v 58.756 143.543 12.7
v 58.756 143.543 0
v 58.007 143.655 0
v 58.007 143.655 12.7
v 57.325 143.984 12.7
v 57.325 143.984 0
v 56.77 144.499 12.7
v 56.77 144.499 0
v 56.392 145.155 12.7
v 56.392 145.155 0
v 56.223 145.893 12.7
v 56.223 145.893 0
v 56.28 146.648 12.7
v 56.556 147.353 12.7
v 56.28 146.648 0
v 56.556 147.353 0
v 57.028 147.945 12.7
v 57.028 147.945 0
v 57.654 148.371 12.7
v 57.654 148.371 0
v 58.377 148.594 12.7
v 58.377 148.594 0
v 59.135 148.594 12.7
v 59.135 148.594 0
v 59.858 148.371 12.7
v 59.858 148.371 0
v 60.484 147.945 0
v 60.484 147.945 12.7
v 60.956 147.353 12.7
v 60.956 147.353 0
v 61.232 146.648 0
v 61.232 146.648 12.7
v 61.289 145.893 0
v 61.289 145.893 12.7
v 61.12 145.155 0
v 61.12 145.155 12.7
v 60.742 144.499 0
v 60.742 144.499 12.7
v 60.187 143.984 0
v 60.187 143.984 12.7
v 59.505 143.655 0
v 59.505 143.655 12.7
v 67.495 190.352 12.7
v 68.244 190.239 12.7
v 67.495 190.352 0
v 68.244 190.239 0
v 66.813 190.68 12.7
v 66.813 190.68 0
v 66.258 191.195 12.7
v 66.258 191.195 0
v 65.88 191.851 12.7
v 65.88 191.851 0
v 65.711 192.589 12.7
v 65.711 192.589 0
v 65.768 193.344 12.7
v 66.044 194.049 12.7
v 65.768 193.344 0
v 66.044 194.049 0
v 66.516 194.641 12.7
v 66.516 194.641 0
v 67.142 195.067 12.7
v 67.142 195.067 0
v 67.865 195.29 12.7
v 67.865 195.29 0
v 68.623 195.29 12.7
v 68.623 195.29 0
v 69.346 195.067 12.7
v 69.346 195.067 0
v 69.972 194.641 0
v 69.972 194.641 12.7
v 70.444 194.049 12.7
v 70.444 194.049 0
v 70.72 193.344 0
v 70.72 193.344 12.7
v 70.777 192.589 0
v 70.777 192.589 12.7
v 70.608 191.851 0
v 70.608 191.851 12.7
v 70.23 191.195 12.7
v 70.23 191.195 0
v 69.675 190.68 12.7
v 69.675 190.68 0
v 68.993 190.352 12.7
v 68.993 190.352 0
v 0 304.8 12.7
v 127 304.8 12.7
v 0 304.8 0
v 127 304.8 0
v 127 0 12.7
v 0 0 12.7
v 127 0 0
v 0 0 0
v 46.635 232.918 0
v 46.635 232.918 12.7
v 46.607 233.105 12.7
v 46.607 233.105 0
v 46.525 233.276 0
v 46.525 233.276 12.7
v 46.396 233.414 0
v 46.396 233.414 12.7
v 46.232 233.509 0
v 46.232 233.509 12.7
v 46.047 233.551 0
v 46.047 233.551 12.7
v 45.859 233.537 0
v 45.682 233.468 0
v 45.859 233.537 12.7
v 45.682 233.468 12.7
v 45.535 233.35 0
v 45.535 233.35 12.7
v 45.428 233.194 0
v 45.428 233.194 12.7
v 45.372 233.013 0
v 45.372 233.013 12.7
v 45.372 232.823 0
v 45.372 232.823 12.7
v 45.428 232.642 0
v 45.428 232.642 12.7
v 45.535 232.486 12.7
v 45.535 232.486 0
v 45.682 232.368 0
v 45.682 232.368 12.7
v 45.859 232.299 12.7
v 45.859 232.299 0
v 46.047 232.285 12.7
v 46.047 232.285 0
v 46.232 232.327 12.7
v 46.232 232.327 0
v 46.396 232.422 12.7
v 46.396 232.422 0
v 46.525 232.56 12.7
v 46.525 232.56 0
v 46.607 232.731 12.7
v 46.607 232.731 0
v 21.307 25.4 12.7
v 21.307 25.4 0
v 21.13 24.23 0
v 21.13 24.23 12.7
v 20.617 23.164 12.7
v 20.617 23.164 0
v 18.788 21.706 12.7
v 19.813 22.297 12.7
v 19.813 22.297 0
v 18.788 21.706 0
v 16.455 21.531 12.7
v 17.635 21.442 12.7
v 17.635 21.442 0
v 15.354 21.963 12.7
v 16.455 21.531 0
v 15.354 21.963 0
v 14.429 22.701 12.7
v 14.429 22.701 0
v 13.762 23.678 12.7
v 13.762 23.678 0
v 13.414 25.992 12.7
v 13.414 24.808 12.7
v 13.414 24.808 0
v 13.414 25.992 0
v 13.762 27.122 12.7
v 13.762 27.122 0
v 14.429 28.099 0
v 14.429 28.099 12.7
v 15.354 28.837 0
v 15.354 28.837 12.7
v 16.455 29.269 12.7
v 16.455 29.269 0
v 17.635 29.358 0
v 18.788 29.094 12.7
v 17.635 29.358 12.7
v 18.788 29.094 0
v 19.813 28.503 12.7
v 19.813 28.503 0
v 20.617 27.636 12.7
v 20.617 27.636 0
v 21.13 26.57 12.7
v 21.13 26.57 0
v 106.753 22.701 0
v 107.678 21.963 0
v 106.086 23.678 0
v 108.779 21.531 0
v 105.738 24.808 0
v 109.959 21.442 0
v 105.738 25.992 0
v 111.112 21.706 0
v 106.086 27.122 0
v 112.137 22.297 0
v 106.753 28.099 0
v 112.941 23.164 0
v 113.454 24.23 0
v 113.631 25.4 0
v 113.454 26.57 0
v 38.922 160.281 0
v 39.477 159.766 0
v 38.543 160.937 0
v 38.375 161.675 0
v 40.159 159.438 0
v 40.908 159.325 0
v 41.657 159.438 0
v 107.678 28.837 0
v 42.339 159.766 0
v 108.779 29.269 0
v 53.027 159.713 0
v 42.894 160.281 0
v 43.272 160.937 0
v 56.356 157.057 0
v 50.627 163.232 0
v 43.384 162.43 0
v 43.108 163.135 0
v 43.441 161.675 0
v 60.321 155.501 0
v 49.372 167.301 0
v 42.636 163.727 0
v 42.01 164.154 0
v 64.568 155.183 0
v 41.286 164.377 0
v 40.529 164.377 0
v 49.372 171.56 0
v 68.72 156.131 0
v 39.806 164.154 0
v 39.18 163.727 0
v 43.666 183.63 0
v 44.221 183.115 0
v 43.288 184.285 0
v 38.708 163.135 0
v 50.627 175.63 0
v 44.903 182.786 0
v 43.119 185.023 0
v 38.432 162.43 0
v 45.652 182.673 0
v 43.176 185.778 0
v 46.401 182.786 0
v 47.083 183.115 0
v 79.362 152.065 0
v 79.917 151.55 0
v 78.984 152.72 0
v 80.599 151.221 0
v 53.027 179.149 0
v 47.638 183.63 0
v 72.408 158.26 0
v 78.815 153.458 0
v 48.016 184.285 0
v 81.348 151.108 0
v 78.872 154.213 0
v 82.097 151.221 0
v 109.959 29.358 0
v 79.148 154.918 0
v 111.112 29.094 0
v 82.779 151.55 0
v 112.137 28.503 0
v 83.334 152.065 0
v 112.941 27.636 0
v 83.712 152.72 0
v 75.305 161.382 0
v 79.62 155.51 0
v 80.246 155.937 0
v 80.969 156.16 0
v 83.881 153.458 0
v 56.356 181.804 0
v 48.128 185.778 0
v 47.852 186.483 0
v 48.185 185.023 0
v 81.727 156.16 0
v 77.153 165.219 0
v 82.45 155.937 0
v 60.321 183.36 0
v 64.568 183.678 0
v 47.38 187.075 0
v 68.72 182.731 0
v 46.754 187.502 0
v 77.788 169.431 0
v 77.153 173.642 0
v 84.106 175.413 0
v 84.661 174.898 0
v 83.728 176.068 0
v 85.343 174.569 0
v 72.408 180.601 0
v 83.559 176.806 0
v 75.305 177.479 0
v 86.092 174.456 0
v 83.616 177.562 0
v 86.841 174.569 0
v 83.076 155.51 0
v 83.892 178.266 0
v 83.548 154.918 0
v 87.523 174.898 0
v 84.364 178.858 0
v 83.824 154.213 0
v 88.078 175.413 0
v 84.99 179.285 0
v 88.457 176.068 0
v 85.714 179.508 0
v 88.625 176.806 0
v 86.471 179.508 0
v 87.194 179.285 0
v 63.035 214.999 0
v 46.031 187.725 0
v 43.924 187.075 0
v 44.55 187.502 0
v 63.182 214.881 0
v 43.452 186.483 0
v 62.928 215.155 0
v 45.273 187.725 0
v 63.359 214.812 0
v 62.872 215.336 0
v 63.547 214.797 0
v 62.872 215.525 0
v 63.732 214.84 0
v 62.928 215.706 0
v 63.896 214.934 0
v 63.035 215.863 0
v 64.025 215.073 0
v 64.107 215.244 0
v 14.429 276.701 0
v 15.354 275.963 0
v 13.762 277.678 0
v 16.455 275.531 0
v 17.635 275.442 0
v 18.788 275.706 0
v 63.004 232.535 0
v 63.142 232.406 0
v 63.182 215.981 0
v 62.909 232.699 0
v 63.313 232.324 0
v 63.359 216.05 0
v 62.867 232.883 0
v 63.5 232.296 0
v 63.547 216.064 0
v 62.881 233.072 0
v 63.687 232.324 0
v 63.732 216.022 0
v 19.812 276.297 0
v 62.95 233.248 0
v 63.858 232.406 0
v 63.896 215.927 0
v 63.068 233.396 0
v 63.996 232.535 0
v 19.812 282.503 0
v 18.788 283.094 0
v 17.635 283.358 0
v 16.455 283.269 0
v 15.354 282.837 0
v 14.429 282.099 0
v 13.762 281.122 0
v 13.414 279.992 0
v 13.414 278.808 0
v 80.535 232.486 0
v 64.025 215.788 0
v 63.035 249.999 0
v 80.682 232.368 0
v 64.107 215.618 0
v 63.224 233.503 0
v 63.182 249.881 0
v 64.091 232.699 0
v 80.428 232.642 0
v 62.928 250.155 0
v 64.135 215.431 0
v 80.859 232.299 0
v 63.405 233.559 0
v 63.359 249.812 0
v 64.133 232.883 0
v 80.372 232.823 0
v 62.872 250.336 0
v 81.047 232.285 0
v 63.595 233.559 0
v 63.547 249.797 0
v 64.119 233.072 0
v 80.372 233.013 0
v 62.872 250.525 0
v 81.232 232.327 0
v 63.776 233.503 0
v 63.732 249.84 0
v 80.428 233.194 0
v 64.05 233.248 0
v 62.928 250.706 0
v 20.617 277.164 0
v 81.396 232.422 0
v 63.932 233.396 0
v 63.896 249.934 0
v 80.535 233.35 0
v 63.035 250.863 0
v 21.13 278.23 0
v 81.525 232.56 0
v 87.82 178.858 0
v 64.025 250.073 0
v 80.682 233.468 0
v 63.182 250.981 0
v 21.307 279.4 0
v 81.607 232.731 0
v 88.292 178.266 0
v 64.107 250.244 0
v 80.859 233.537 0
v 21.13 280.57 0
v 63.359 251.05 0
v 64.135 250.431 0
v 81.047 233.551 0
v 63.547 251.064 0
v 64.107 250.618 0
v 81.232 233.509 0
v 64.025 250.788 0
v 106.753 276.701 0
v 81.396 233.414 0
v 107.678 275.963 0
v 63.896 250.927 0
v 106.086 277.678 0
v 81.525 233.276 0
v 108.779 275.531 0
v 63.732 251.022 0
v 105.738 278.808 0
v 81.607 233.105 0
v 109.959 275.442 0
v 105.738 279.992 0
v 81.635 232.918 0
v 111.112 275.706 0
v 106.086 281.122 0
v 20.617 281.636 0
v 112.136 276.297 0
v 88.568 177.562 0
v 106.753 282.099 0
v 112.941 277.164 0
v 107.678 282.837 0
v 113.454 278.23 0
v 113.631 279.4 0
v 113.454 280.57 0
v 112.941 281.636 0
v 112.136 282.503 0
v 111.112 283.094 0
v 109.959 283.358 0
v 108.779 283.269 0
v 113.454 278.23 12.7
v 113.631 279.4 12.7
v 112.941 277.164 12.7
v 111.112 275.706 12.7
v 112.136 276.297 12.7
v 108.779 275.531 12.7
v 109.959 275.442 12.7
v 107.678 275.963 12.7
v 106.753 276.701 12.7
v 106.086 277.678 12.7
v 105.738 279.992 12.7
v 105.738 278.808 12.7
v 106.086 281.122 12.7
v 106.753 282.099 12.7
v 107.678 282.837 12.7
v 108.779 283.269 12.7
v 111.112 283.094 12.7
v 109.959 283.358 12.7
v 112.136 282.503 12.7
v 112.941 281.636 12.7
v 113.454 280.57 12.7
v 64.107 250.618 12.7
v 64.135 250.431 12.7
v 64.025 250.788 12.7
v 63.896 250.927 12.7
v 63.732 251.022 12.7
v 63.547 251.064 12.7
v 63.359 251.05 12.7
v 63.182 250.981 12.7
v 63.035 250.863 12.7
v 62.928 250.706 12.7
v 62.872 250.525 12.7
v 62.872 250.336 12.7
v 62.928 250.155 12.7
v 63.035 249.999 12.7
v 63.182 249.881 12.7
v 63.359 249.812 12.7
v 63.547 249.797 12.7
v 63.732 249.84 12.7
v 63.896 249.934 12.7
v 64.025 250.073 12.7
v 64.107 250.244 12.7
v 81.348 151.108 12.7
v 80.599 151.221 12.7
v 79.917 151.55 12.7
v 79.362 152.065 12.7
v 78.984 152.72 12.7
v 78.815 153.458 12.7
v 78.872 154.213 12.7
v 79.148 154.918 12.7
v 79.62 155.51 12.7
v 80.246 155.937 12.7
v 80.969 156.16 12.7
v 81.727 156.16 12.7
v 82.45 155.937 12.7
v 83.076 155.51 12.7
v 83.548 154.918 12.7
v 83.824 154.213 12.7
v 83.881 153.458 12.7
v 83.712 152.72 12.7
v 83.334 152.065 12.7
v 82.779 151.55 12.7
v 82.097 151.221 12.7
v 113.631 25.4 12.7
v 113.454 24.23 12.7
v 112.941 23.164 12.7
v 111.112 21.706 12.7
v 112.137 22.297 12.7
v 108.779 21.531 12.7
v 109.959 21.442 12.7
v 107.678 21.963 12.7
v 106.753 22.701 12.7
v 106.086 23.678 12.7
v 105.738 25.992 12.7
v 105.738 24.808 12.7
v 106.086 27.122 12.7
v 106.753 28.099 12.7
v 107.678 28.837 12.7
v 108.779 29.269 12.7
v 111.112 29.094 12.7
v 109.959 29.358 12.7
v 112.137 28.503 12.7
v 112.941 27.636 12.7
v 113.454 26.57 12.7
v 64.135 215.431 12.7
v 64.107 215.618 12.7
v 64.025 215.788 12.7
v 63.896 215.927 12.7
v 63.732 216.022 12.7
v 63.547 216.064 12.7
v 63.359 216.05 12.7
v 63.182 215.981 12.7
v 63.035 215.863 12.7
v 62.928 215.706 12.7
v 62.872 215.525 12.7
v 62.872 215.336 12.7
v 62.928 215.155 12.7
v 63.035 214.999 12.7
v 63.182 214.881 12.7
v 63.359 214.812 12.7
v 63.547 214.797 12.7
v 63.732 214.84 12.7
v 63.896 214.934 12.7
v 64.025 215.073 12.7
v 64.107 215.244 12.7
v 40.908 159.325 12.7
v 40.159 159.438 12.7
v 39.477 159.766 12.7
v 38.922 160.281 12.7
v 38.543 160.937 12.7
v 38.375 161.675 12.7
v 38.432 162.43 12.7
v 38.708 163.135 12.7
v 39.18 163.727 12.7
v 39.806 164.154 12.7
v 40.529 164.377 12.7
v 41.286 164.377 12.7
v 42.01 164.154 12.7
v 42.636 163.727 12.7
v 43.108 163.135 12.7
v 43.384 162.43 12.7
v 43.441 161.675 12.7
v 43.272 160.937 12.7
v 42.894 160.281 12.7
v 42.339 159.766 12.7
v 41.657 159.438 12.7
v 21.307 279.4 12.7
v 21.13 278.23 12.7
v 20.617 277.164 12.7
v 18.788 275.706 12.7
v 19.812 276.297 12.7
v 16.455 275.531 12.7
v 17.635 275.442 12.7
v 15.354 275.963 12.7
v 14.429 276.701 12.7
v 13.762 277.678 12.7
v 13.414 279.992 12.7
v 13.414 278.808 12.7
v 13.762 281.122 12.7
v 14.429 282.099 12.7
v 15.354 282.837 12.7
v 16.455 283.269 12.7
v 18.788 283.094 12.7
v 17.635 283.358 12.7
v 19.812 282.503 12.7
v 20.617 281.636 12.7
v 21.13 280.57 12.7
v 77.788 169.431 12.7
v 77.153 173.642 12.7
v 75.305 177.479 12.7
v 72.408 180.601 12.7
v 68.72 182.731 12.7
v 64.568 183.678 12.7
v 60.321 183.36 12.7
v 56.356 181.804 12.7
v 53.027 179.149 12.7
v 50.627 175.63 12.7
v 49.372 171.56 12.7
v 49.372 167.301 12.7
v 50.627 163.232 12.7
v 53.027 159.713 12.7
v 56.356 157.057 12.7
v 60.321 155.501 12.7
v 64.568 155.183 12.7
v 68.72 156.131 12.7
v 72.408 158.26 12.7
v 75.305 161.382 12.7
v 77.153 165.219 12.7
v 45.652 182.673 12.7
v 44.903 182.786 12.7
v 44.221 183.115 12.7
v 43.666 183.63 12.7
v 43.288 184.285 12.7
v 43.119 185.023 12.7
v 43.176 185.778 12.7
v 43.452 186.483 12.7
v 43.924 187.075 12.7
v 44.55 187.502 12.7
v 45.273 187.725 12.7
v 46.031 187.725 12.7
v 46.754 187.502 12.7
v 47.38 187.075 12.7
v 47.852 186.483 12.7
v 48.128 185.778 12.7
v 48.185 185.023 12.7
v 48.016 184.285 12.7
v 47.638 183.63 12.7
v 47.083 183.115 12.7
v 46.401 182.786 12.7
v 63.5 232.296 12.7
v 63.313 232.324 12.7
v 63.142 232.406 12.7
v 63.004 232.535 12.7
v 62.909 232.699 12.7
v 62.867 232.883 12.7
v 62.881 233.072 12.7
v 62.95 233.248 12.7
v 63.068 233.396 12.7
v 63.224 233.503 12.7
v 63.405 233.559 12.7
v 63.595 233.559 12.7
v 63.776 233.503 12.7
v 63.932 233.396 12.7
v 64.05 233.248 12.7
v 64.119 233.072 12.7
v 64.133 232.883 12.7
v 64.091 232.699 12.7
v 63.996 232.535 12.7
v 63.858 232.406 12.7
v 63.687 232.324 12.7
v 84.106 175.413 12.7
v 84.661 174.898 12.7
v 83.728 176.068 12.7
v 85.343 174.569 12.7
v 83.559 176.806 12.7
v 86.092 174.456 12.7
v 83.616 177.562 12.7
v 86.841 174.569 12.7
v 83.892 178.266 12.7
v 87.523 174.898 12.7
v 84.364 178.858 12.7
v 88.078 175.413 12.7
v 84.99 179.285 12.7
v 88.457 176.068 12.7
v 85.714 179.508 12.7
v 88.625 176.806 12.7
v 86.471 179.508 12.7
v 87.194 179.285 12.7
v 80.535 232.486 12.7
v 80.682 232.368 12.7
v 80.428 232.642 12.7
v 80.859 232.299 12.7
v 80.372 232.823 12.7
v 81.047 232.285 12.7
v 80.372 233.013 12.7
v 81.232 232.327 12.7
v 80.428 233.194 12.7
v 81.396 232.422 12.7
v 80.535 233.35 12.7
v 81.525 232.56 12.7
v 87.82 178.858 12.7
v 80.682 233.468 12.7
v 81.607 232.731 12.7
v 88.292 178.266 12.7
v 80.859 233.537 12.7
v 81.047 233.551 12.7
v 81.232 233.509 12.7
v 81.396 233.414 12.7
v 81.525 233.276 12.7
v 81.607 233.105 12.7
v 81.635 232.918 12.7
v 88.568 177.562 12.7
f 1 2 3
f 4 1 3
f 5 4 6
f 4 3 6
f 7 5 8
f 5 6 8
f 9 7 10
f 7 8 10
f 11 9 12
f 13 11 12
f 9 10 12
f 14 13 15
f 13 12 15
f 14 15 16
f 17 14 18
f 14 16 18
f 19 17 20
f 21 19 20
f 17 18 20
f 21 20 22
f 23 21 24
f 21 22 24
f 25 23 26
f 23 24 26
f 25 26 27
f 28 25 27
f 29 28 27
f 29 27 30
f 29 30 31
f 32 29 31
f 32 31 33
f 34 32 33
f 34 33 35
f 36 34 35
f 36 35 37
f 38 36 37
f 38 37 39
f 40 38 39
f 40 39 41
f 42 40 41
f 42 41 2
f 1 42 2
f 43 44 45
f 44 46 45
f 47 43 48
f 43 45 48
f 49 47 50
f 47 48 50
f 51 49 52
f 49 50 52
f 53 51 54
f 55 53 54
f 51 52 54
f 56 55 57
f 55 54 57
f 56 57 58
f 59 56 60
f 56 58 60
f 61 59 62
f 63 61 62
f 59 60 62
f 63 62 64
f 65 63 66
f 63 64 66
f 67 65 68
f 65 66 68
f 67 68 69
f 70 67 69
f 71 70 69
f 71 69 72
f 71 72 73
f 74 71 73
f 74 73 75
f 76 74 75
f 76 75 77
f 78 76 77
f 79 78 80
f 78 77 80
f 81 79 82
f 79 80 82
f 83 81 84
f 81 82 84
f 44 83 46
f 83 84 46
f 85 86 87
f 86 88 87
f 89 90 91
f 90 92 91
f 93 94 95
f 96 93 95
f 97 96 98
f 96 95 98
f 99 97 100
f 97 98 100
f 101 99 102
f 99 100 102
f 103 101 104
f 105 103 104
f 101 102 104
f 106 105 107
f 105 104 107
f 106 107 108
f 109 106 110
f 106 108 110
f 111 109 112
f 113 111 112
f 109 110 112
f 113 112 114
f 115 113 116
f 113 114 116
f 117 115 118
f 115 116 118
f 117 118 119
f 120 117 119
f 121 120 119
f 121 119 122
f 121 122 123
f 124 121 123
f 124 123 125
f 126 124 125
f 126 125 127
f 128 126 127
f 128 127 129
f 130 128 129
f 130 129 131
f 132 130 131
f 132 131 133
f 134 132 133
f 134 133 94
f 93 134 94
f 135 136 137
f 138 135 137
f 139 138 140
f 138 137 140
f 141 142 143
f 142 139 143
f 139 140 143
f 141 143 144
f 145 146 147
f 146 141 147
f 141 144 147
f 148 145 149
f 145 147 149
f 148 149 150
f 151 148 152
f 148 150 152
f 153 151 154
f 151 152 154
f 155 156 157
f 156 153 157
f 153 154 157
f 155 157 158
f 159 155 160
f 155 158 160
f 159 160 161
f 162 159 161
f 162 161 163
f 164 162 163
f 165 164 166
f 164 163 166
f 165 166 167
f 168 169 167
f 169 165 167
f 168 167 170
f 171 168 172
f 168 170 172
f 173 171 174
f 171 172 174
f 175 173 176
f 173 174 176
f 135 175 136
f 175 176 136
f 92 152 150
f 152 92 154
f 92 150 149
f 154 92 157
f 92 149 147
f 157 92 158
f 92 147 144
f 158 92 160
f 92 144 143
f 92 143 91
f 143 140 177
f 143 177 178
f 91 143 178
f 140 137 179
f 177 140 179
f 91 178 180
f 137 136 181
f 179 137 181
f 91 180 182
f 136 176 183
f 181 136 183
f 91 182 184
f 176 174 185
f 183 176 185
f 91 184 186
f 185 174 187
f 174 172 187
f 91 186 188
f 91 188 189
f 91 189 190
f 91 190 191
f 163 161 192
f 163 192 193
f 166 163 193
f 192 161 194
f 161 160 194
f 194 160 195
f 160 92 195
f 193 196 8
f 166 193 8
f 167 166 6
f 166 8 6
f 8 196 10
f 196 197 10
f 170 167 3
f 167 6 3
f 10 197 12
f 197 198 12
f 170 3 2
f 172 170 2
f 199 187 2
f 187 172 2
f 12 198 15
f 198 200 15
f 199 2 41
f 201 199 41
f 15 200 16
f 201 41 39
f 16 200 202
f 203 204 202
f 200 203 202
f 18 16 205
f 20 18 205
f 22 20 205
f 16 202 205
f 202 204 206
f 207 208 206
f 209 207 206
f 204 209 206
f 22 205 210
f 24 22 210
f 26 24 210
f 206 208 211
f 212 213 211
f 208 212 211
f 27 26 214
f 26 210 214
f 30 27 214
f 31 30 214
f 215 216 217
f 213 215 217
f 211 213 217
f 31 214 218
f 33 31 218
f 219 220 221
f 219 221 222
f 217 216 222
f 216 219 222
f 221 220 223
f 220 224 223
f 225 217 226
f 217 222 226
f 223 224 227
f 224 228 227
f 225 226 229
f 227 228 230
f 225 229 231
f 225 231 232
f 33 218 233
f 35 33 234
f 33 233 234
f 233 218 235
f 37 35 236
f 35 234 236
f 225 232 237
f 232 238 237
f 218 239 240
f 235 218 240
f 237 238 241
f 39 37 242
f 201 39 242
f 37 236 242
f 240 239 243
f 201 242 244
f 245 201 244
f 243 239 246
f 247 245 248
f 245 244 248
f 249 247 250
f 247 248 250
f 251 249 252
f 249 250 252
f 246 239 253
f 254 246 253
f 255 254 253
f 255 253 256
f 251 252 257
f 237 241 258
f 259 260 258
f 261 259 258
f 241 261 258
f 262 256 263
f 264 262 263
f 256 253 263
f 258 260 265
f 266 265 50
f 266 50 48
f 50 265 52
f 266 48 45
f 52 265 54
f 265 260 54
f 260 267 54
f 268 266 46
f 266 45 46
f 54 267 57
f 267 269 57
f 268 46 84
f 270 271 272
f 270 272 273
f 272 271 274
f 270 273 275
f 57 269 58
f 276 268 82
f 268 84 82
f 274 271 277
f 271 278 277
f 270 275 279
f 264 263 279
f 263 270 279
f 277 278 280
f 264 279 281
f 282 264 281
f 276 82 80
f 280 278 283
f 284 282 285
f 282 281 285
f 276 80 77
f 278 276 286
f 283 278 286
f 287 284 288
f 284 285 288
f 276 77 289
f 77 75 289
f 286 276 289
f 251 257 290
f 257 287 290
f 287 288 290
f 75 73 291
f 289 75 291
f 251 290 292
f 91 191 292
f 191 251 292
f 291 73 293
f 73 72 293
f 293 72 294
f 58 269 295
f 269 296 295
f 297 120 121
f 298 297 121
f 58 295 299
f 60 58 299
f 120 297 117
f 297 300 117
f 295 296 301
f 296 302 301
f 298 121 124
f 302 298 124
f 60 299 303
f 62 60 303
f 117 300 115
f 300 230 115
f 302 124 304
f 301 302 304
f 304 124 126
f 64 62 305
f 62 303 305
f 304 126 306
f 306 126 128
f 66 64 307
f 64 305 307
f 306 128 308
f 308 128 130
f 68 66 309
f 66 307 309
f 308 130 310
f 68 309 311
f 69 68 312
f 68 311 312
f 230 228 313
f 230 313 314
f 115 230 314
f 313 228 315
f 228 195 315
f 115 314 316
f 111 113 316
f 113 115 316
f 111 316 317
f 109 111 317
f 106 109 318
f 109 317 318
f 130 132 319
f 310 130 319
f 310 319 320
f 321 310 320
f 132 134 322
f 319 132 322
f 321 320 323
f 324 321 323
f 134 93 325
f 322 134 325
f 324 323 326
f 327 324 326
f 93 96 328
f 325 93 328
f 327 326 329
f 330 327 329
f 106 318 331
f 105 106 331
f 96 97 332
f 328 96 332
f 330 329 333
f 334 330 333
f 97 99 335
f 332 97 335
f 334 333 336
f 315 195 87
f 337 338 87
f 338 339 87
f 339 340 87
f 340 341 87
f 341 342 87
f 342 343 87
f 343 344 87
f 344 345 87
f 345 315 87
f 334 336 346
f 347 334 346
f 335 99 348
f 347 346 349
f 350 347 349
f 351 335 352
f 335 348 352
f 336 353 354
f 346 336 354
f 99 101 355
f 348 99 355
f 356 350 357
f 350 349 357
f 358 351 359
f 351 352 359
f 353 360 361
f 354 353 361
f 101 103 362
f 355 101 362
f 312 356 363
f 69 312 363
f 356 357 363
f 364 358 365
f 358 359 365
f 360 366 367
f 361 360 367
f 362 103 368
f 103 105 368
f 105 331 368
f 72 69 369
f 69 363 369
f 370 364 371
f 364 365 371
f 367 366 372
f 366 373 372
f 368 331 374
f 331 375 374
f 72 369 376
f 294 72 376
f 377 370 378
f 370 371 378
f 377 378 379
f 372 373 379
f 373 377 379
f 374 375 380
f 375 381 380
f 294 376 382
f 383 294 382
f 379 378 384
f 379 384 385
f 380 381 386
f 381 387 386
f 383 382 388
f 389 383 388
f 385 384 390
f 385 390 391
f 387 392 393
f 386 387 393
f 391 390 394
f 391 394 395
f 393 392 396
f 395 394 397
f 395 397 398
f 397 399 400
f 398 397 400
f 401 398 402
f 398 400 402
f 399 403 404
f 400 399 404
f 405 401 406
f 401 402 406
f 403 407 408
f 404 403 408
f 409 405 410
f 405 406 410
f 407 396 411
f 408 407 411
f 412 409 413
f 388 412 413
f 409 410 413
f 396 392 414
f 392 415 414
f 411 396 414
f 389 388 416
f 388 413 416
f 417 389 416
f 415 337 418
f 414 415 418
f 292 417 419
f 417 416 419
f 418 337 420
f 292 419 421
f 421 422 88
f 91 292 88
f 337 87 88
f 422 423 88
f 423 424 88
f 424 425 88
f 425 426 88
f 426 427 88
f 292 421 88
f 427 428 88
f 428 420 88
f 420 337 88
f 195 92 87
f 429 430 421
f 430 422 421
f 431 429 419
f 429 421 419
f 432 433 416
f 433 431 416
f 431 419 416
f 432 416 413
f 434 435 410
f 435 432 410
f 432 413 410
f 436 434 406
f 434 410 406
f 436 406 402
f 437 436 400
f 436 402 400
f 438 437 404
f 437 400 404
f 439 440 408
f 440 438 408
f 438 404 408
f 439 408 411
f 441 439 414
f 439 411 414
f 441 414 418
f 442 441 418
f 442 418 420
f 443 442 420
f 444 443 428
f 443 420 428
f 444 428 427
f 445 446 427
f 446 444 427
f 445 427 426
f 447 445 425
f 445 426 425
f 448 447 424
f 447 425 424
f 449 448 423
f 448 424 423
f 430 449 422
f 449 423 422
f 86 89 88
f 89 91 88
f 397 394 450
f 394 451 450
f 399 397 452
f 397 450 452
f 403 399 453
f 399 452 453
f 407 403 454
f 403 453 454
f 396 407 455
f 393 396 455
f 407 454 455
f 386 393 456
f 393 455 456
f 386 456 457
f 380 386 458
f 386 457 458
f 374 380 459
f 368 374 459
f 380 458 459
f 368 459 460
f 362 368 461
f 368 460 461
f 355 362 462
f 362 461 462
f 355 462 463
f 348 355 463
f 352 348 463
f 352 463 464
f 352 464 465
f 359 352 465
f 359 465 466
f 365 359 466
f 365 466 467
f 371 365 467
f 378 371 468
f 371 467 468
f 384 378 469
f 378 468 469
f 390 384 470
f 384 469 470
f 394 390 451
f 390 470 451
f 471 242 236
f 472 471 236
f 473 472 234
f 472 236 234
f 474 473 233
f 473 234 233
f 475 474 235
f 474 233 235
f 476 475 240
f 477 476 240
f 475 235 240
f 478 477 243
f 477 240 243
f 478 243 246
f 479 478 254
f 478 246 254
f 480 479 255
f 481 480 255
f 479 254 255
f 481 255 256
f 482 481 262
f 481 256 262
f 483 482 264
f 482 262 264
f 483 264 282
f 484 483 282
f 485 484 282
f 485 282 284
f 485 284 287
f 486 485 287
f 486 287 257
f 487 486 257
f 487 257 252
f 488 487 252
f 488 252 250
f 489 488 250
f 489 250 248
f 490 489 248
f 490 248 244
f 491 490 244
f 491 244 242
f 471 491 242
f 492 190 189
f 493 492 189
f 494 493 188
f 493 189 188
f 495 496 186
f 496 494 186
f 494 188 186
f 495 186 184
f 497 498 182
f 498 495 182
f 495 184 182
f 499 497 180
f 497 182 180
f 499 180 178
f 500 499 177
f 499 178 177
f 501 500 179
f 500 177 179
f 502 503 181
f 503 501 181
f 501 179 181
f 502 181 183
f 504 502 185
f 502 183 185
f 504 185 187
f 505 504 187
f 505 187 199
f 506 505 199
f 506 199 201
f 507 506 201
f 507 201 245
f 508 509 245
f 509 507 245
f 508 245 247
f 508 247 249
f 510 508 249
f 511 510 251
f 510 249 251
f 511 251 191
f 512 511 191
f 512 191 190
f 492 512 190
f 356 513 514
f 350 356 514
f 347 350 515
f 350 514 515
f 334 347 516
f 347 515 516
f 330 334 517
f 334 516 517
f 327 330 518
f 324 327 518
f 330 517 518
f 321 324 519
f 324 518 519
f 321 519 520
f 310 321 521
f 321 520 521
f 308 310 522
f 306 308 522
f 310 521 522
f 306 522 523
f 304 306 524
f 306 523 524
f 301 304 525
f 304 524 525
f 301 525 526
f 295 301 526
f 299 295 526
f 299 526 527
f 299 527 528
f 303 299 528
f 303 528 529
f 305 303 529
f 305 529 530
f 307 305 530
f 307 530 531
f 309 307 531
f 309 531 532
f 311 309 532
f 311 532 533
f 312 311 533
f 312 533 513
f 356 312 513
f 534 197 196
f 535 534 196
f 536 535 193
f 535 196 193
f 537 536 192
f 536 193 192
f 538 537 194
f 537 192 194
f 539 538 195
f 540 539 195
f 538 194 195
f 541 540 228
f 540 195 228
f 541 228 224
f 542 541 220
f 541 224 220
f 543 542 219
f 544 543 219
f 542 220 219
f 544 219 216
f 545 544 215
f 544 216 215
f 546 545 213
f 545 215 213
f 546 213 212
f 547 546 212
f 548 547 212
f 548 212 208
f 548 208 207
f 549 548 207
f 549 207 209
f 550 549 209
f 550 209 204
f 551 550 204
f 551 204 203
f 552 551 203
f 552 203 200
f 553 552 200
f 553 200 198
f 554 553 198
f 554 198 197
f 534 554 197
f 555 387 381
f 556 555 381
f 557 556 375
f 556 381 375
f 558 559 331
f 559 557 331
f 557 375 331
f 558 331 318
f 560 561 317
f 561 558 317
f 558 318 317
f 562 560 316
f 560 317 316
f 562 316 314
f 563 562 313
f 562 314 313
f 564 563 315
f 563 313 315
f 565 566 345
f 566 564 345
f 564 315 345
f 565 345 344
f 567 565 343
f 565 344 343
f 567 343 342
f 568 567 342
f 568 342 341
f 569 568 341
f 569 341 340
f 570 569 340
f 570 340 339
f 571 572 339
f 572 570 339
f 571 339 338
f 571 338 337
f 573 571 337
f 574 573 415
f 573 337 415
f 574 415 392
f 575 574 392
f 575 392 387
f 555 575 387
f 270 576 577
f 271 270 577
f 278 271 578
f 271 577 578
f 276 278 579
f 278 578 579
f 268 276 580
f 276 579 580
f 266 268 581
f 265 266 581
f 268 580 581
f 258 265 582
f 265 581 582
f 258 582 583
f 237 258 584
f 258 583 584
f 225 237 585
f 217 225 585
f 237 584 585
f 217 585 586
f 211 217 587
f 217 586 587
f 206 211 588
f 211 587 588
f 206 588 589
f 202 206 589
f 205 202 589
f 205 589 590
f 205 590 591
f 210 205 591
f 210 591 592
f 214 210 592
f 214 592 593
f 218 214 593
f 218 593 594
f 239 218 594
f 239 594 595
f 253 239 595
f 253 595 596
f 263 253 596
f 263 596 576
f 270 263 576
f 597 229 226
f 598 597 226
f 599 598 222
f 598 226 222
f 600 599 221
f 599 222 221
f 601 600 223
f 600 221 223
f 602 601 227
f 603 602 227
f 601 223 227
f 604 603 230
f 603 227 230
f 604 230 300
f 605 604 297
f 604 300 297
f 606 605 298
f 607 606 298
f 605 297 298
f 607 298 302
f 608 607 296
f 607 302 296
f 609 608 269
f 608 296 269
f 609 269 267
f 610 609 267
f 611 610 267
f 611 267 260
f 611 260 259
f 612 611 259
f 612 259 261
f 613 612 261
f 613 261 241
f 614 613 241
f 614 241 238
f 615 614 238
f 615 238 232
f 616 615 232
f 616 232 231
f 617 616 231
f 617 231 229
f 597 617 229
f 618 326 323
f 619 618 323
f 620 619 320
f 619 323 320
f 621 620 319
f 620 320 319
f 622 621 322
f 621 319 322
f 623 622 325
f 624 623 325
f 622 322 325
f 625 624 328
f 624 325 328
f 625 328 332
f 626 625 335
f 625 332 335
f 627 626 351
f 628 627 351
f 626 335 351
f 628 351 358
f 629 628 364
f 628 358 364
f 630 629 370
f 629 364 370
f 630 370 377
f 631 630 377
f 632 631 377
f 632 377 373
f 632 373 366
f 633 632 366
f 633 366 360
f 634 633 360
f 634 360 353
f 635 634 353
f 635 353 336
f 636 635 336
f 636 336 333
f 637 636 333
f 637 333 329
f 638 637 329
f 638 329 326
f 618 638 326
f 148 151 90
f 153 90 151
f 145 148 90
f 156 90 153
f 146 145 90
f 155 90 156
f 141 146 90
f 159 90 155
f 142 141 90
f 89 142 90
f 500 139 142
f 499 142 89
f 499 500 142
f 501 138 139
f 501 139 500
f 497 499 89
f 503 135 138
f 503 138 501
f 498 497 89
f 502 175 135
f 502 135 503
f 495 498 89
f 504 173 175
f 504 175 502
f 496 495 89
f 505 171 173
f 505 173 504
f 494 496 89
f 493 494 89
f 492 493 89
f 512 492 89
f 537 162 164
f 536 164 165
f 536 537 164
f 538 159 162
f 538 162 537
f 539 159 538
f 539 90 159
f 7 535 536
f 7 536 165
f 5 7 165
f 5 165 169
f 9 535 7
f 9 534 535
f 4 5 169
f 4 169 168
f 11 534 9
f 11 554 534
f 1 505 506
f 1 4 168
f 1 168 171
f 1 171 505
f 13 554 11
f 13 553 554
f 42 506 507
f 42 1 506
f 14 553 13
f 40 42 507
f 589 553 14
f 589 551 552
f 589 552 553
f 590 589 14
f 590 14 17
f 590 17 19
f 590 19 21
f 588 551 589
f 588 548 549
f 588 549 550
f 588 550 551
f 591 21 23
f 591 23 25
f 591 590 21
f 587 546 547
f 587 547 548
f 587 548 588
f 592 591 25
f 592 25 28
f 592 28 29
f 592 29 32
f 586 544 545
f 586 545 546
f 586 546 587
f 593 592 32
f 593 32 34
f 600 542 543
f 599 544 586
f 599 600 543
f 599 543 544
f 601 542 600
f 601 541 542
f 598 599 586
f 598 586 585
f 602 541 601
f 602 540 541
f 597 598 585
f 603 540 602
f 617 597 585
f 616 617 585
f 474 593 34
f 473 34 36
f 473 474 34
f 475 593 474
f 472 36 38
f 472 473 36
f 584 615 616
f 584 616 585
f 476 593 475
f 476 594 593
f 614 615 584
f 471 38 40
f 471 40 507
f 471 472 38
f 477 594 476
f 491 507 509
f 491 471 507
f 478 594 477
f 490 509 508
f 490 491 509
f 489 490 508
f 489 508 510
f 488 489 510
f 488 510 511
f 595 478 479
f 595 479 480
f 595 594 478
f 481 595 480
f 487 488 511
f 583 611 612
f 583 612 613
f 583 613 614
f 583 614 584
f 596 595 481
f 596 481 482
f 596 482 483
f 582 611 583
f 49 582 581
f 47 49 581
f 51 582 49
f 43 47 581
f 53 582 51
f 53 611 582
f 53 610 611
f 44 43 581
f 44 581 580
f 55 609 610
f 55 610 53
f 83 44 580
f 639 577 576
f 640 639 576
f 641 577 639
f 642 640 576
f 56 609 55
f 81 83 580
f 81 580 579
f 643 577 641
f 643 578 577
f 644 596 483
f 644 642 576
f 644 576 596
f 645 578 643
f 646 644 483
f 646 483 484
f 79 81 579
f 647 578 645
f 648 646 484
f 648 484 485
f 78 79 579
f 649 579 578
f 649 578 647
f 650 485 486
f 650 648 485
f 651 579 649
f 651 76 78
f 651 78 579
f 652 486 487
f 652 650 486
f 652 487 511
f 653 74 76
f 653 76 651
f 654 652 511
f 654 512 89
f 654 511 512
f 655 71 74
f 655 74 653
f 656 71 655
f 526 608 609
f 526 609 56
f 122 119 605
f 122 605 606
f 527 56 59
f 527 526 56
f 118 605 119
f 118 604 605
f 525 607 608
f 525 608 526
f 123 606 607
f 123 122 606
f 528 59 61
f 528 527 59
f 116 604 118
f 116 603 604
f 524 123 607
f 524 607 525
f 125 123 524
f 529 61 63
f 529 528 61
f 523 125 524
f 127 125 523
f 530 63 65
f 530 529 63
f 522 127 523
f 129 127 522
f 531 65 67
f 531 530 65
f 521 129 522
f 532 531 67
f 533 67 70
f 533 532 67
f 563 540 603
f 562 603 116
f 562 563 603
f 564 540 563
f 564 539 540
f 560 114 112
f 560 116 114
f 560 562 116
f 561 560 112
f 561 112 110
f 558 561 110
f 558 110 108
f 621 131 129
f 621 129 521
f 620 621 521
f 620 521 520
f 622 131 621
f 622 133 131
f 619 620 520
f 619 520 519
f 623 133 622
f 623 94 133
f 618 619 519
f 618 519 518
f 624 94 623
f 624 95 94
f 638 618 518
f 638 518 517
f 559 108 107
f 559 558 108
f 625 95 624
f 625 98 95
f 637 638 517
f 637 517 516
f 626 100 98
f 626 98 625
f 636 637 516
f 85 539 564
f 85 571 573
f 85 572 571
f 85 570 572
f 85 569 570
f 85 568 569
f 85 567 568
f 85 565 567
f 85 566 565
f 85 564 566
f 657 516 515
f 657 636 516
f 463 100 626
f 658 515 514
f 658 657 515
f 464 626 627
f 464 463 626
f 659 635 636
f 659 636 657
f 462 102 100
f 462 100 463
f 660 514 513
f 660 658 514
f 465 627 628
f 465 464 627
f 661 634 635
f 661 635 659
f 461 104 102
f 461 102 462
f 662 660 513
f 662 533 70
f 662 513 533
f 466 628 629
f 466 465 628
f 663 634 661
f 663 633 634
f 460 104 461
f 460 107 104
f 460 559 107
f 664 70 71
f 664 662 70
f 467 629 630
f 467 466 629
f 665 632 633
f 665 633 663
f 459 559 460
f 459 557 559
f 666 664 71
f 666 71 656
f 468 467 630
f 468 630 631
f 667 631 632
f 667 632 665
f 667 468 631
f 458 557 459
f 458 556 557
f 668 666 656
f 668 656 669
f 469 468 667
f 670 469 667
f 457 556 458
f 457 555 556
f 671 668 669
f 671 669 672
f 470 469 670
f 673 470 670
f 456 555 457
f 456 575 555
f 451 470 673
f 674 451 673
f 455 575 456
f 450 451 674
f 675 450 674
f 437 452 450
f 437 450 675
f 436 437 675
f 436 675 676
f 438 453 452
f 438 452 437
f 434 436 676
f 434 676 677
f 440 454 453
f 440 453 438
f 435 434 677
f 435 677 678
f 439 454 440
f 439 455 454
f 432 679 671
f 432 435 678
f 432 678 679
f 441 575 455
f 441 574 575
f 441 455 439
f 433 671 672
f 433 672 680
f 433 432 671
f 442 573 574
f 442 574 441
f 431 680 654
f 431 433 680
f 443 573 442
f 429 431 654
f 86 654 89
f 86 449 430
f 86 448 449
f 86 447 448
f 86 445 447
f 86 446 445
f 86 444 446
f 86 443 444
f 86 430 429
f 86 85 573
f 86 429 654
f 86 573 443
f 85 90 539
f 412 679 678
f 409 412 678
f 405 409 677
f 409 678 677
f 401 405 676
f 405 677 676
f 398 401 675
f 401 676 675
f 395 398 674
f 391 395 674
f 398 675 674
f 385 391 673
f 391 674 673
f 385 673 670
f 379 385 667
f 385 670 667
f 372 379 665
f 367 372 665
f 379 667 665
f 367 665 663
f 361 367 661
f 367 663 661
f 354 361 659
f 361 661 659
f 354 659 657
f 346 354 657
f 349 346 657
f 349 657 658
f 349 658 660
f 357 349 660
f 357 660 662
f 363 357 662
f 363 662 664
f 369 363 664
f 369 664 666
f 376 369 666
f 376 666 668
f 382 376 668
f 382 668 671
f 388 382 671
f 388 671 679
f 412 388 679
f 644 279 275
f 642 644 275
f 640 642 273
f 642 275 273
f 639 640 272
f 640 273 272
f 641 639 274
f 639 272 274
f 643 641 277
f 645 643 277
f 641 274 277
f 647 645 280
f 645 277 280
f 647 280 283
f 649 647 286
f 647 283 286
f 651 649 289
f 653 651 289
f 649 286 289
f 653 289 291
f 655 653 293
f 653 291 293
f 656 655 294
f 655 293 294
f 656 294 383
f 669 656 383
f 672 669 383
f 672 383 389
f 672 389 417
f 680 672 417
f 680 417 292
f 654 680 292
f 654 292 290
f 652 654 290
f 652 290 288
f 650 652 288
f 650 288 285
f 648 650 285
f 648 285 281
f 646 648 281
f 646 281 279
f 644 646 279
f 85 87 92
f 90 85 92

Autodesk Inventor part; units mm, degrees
ref_plane "YZ Plane" through (0, 0, 0) normal (1, 0, 0) x (0, 1, 0)
ref_plane "XZ Plane" through (0, 0, 0) normal (0, 1, 0) x (-1, 0, 0)
ref_plane "XY Plane" through (0, 0, 0) normal (0, 0, 1) x (1, 0, 0)
sketch "Sketch1" plane through (0, 0, 0) normal (0, 0, 1) x (1, 0, 0)
  point P0 (0, 0)
sketch "Sketch2" plane through (0, 0, 0) normal (0, 0, 1) x (1, 0, 0)
  line L0 (0, 0) -> (127, 0)
  line L1 (127, 0) -> (127, 304.8)
  line L2 (127, 304.8) -> (0, 304.8)
  line L3 (0, 304.8) -> (0, 0)
  circle A0 centre (17.338, 279.4) radius 3.9687
  circle A1 centre (109.662, 279.4) radius 3.9687
  circle A2 centre (17.338, 25.4) radius 3.9688
  circle A3 centre (109.662, 25.4) radius 3.9688
  dimension "d0" = 127
  dimension "d1" = 304.8
  dimension "d2" = 7.9375
  dimension "d3" = 25.4
  dimension "d4" = 17.338
  dimension "d5" = 7.9375
  dimension "d6" = 17.338
  dimension "d7" = 25.4
  dimension "d8" = 7.9375
  dimension "d9" = 17.338
  dimension "d10" = 25.4
  dimension "d11" = 7.9375
  dimension "d12" = 17.338
  dimension "d13" = 25.4
extrude "Extrusion1" add sketch "Sketch2" along normal blind 12.7
sketch "Sketch3" plane through (0, 0, 12.7) normal (0, 0, 1) x (1, 0, 0)
  line L0 (127, 304.8) -> (0, 304.8) projected
  line L1 (0, 0) -> (127, 0) projected
  line L2 (0, 304.8) -> (0, 0) projected
  line L3 (127, 0) -> (127, 304.8) projected
  circle A0 centre (46, 232.918) radius 0.635
  circle A1 centre (63.5, 250.4307) radius 0.635
  circle A2 centre (63.5, 215.4307) radius 0.635
  circle A3 centre (81, 232.918) radius 0.635
  circle A4 centre (63.5, 169.4307) radius 14.2875
  circle A5 centre (63.5, 169.4307) radius 23.8252
  point P0 (63.5, 232.9307)
  point P1 (68.244, 192.7788)
  point P2 (45.652, 185.2132)
  point P3 (40.9079, 161.8651)
  point P4 (58.756, 146.0826)
  point P5 (81.348, 153.6482)
  point P6 (86.0921, 176.9963)
  dimension "d18" = 63.5
  dimension "d19" = 63.5
  dimension "d31" = 1.27
  dimension "d32" = 1.27
  dimension "d33" = 1.27
  dimension "d34" = 1.27
  dimension "d45" = 34.9999
  dimension "d46" = 17.5
  dimension "d47" = 17.5
  dimension "d48" = 17.5
  dimension "d49" = 28.575
  dimension "d50" = 169.4307
  dimension "d53" = 23.8252
  dimension "d56" = 360
  dimension "d66" = 63.5
  dimension "d67" = 63.5
  dimension "d68" = 63.5
  dimension "d69" = 63.5
  dimension "d70" = 71.8693
  dimension "d71" = 71.882
  dimension "d72" = 71.882
hole "Hole1" at (63.5, 232.9307, 12.7) direction (0, 0, -1) diameter 1.27 end through all
extrude "Extrusion2" cut sketch "Sketch3" against normal blind 25.4 contours A0 | A1 | A2 | A3
extrude "Extrusion3" cut sketch "Sketch3" against normal blind 25.4 contours A4
hole "Hole2" at (68.244, 192.7788, 12.7) at (45.652, 185.2132, 12.7) at (40.9079, 161.8651, 12.7) at (58.756, 146.0826, 12.7) at (81.348, 153.6482, 12.7) at (86.0921, 176.9963, 12.7) direction (0, 0, -1) diameter 5.08 end through all
